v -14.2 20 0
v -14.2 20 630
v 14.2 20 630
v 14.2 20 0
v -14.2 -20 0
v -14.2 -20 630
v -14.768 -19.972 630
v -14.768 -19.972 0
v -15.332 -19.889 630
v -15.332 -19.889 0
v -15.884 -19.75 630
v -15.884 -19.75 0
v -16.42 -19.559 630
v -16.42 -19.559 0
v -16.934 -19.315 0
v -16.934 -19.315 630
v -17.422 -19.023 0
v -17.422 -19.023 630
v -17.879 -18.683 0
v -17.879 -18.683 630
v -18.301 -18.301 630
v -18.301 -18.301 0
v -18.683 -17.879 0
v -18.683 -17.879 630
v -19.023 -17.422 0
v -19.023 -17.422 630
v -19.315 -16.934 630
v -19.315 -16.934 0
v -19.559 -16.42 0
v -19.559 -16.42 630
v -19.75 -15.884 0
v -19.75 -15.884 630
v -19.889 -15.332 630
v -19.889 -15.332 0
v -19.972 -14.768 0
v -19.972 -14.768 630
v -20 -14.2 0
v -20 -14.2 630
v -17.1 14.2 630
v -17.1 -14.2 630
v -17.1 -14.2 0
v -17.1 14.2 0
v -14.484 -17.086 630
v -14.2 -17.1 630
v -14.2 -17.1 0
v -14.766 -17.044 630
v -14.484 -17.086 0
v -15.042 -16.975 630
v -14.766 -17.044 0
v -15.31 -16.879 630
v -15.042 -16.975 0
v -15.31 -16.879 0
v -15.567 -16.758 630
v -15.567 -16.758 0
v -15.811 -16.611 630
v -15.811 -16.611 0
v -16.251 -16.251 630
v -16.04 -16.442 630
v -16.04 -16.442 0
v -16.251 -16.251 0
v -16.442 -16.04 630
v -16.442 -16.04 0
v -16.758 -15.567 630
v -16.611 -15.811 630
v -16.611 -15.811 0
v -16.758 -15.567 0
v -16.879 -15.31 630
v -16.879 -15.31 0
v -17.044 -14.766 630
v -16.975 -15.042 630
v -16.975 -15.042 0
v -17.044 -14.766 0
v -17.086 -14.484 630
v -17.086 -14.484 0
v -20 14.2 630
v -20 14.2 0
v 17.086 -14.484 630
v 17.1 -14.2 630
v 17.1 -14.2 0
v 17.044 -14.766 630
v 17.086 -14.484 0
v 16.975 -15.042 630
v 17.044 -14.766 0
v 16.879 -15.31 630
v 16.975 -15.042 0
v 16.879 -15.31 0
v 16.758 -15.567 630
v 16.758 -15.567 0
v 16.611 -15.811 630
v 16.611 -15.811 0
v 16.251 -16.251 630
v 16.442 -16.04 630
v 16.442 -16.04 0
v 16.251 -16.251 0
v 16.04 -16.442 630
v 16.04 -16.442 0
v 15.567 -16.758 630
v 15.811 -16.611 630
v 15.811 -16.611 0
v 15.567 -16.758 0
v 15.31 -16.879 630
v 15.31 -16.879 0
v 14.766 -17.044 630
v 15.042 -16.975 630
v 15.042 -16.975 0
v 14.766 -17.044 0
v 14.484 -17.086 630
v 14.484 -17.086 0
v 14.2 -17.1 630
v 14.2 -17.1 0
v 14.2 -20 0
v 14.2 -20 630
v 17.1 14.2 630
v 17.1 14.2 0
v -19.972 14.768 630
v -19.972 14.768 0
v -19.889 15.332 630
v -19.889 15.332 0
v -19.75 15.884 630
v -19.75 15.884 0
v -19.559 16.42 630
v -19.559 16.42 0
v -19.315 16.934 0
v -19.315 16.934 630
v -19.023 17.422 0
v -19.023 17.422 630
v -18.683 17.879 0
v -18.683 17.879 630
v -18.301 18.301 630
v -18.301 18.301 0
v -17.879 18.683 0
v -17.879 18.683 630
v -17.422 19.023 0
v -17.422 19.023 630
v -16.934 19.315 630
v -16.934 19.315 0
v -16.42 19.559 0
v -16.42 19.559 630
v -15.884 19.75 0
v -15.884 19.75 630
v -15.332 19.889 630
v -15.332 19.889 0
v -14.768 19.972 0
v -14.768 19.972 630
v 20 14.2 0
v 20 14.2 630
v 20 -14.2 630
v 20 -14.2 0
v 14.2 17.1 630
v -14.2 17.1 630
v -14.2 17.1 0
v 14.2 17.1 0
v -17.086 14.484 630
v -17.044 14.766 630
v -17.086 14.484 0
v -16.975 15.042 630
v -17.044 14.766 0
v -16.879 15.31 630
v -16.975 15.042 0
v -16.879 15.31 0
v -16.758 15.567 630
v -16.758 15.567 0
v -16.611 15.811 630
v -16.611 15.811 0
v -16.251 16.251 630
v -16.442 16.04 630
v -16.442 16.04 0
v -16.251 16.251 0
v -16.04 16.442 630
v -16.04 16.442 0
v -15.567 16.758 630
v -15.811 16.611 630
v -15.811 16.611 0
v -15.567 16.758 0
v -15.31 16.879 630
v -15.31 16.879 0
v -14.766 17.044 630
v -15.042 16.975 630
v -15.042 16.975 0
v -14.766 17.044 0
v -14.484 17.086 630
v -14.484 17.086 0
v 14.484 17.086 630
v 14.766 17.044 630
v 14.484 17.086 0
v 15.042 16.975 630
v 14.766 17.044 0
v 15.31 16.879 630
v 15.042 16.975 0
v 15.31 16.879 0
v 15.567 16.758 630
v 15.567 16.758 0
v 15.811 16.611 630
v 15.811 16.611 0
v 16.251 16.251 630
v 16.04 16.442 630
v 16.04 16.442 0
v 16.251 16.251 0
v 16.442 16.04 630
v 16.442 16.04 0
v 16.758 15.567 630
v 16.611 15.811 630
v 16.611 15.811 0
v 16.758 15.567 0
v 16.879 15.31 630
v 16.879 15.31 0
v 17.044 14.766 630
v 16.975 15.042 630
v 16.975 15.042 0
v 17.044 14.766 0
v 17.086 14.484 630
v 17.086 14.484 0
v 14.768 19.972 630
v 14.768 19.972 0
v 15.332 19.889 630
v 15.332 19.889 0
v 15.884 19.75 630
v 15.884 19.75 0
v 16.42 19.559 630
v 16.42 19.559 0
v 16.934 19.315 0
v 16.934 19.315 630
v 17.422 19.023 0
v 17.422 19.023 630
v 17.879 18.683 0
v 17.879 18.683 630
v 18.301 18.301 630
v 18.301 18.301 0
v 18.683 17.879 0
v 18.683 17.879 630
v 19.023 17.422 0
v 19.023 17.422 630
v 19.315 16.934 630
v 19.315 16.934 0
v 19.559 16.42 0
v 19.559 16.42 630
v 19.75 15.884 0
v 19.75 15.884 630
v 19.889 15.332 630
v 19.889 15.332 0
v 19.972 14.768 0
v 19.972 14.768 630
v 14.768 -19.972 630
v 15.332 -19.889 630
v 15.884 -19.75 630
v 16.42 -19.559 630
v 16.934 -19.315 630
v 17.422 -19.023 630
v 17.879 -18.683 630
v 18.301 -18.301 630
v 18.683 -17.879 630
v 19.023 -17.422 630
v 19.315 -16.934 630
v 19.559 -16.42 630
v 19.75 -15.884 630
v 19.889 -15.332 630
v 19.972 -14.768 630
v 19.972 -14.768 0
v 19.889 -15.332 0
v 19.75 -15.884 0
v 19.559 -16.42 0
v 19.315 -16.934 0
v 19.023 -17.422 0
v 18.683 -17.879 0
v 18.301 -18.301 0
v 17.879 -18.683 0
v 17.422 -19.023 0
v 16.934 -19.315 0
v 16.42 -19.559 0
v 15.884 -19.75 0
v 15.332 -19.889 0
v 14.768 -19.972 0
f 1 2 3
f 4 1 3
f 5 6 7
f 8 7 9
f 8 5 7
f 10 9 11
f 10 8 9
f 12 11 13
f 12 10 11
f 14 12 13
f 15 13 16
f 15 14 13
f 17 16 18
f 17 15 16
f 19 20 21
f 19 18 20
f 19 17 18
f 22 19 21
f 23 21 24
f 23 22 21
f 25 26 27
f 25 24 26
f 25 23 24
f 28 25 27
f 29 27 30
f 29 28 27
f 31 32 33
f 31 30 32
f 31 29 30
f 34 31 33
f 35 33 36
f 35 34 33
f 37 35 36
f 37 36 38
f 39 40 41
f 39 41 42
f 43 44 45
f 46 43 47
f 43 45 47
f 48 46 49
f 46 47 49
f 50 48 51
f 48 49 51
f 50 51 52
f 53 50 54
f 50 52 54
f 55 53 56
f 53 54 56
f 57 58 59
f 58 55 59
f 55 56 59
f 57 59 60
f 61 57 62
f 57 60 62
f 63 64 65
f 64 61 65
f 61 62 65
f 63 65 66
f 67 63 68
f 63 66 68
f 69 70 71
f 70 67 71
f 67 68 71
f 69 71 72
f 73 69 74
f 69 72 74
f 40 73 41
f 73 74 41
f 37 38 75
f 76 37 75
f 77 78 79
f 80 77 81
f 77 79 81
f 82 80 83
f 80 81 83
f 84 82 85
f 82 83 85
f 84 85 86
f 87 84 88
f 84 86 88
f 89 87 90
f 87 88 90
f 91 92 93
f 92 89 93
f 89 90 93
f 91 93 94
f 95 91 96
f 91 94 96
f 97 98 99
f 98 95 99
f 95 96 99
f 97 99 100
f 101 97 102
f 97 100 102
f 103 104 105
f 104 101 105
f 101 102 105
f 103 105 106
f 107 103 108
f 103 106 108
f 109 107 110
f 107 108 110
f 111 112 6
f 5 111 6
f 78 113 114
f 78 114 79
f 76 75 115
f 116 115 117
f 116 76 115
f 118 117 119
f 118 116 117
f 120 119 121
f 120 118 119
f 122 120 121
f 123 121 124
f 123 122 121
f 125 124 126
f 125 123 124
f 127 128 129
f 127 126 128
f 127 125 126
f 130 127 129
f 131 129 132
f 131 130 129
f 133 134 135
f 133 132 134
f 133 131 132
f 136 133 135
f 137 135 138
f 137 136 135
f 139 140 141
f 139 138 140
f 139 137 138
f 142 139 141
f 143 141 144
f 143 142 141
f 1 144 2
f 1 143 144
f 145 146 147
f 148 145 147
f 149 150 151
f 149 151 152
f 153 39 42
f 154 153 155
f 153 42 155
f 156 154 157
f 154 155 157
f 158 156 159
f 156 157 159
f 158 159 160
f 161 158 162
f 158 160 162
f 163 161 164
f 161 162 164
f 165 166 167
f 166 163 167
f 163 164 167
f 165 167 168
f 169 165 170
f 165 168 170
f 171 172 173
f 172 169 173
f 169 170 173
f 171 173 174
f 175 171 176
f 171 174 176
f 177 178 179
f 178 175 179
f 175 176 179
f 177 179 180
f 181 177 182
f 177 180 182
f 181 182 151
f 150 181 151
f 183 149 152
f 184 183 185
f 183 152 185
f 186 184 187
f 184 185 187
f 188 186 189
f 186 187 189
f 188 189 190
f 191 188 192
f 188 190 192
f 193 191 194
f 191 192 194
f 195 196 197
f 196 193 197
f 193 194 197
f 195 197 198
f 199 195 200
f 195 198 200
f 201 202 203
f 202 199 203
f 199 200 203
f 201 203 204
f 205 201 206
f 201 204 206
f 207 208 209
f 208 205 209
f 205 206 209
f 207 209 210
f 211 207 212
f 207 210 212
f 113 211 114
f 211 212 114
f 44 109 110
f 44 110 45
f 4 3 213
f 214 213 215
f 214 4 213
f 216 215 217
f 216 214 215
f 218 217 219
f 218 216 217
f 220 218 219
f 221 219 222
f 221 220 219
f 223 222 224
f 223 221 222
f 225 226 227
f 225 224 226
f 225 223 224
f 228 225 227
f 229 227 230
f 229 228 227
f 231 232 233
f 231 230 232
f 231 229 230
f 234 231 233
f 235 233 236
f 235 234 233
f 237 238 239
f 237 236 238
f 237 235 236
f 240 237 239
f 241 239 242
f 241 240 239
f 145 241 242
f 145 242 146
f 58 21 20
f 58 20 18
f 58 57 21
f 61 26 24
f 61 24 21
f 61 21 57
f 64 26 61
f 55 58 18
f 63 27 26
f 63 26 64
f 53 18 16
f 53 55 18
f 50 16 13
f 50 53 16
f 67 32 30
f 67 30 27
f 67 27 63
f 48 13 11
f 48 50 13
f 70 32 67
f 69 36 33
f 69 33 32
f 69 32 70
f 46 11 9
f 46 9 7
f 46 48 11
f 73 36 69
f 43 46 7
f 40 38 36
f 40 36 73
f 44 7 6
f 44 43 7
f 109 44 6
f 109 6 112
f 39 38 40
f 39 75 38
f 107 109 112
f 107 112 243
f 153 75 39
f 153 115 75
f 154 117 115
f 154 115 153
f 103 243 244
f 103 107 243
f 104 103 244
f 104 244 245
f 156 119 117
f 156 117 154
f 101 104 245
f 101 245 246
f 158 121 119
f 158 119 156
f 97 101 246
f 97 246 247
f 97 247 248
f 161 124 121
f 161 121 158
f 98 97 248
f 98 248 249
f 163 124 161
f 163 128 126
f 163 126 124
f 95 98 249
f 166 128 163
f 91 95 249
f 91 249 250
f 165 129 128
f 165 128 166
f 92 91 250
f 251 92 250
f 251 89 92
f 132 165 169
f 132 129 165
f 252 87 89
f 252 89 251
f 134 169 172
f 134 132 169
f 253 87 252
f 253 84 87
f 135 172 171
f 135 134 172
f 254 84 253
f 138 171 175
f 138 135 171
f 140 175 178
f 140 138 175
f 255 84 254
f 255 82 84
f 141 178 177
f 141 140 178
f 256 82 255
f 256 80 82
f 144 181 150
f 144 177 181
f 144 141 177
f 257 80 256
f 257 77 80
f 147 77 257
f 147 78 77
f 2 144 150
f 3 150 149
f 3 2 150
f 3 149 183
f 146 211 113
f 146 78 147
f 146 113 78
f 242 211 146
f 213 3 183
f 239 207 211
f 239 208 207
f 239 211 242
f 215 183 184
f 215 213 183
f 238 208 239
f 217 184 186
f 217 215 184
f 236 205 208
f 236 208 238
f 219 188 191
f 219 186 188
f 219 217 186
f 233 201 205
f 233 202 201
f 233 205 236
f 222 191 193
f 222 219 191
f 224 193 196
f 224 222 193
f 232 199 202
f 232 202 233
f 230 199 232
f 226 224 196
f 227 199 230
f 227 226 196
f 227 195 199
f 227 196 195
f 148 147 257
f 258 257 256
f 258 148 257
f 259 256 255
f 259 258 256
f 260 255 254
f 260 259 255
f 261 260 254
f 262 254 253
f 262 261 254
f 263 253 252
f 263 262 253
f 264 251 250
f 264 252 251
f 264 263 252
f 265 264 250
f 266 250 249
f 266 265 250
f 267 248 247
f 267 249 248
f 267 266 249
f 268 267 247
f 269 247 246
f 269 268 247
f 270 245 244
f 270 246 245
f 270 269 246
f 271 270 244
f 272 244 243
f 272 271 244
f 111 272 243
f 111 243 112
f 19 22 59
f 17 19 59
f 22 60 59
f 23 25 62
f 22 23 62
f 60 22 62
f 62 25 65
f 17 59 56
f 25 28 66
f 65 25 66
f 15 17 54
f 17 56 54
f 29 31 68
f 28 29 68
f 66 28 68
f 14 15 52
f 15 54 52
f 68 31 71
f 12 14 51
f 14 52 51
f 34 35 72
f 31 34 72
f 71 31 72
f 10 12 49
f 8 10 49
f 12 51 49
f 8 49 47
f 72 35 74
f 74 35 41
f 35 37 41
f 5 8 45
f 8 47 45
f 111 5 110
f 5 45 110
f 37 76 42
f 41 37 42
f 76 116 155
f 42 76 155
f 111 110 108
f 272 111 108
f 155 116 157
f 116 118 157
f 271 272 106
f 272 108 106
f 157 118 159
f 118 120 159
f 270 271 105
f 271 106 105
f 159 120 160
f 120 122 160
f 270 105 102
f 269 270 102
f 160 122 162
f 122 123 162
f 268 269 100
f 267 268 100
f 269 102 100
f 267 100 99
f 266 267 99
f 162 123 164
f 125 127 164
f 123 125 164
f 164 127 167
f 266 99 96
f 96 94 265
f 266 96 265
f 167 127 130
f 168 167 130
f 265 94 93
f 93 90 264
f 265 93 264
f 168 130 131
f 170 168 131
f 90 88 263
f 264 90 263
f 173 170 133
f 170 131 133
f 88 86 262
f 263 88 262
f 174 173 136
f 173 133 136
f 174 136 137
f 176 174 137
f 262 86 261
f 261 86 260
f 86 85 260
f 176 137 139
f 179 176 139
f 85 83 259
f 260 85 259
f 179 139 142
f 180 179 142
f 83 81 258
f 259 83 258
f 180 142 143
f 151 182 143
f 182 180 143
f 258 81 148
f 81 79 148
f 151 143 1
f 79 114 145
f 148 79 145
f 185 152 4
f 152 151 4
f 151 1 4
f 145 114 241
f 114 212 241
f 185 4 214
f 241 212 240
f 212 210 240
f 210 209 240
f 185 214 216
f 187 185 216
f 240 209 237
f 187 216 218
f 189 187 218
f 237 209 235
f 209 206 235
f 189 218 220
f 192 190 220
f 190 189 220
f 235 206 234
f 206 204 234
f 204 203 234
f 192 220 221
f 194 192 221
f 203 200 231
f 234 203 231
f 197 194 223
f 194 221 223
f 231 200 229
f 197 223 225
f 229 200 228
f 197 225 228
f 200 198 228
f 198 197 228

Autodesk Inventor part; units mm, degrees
ref_plane "YZ Plane" through (0, 0, 0) normal (1, 0, 0) x (0, 1, 0)
ref_plane "Plano inicial" through (0, 0, 0) normal (0, 0, 1) x (1, 0, 0)
ref_plane "Plano final" through (0, 0, 630) normal (0, 0, 1) x (1, 0, 0)
sketch "Boceto" plane through (0, 0, 0) normal (0, 0, 1) x (1, 0, 0)
  line L0 (-14.2, 20) -> (14.2, 20)
  line L1 (20, 14.2) -> (20, -14.2)
  line L2 (14.2, -20) -> (-14.2, -20)
  line L3 (-20, -14.2) -> (-20, 14.2)
  arc A0 (-14.2, 20) -> (-20, 14.2) centre (-14.2, 14.2) ccw
  arc A1 (20, 14.2) -> (14.2, 20) centre (14.2, 14.2) ccw
  arc A2 (14.2, -20) -> (20, -14.2) centre (14.2, -14.2) ccw
  arc A3 (-20, -14.2) -> (-14.2, -20) centre (-14.2, -14.2) ccw
  line L4 (-29.6817, 0) -> (29.6817, 0) construction
  line L5 (0, -29.6817) -> (0, 29.6817) construction
  arc A4 (-14.2, 17.1) -> (-17.1, 14.2) centre (-14.2, 14.2) ccw
  line L6 (-14.2, 17.1) -> (14.2, 17.1)
  arc A5 (17.1, 14.2) -> (14.2, 17.1) centre (14.2, 14.2) ccw
  line L7 (17.1, 14.2) -> (17.1, -14.2)
  arc A6 (14.2, -17.1) -> (17.1, -14.2) centre (14.2, -14.2) ccw
  line L8 (14.2, -17.1) -> (-14.2, -17.1)
  arc A7 (-17.1, -14.2) -> (-14.2, -17.1) centre (-14.2, -14.2) ccw
  line L9 (-17.1, -14.2) -> (-17.1, 14.2)
  point P0 (-20, 20)
  point P1 (20, -20)
  point P2 (20, 20)
  dimension "b" = 40
  dimension "msp_r" = 5.8
  dimension "d8" = 20
  dimension "d9" = 20
  dimension "d10" = 2.9
extrude "Cuerpo" add sketch "Boceto" along normal up to surface (630 mm away) from surface at 0
sketch "Sketch2" plane through (0, 0, 0) normal (0, 0, 1) x (1, 0, 0)
  line L0 (0, 0) -> (10, 0)
ref_plane "Work Plane3" through (0, 0, 0) normal (0, -1, 0) x (1, 0, 0)
sketch "Sketch3" plane through (0, 0, 0) normal (0, -1, 0) x (1, 0, 0)
  line L0 (-2, 0) -> (12, 0)
  line L1 (-2, 630) -> (12, 630)
  dimension "d14" = 630
equation "\"msp_r\" = 2 * ParT"
equation "\"d8\" = d9"
equation "\"d9\" = 0.5 * b"
equation "\"d10\" = ParT"
equation "\"G_OFFSET_START\" = 0"
equation "\"G_OFFSET_END\" = 0"
equation "\"G_L\" = d14"
equation "\"ParT\" = 2.9"
properties part number "DIN 59 410 - 40x40x2.9-630" material "Acero, suave"
